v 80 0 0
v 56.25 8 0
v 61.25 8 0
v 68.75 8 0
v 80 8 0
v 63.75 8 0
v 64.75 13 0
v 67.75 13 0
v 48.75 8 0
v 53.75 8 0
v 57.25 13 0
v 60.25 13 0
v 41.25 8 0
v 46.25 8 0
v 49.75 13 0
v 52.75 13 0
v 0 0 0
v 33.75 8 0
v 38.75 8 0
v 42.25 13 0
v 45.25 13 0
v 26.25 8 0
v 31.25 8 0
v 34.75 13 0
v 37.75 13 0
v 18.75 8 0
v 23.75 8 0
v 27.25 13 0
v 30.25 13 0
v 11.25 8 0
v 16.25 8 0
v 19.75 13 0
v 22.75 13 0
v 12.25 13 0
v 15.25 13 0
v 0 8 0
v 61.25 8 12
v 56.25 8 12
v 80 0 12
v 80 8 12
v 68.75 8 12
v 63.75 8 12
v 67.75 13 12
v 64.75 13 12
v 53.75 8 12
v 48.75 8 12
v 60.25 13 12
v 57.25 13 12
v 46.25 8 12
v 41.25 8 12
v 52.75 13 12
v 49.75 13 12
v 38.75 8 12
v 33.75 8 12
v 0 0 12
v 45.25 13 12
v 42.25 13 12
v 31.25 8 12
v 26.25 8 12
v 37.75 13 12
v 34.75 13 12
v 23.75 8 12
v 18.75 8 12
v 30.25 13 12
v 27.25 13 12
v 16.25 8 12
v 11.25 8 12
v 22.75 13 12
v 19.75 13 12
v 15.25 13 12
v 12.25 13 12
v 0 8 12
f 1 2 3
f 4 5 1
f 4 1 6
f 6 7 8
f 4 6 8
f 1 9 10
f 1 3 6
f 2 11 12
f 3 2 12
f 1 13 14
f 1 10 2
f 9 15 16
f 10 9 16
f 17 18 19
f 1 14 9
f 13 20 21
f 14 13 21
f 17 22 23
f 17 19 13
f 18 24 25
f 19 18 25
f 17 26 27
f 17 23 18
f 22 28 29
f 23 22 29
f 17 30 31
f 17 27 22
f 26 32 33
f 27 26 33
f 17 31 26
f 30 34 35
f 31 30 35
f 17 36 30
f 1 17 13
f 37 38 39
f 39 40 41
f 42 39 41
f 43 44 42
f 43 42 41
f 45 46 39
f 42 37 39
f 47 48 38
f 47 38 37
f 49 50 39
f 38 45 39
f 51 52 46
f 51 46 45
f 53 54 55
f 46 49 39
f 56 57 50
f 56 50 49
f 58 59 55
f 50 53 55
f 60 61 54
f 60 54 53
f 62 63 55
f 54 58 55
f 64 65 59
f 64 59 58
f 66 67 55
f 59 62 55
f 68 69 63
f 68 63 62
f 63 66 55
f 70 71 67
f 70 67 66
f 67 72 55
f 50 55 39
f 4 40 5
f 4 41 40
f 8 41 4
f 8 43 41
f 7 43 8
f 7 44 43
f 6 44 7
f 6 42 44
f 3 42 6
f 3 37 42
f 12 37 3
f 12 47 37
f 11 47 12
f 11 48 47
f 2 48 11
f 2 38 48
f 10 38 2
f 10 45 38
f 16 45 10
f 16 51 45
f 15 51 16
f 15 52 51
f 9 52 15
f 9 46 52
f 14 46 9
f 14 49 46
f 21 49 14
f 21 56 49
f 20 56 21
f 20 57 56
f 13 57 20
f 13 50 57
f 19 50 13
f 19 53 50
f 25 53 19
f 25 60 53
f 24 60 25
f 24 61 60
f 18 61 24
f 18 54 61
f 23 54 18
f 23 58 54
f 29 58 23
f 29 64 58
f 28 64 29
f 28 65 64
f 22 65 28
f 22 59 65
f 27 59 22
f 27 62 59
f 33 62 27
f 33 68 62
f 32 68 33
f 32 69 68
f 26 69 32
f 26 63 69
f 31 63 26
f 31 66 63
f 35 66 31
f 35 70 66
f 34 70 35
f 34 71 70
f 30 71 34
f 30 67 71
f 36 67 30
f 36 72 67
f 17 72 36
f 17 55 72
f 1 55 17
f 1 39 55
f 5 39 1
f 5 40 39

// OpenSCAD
$fn = 32;

// ----------------------------------------------------------------------
// Gear rack: 8 teeth on a 80 mm bar, pitch 7.5 mm
// ----------------------------------------------------------------------

// --- parameters (mm) ---
profile_height = 12;      // extrusion height
profile_points = 36;      // points of the closed outline

profile = [[0, 0], [80, 0], [80, 8], [68.75, 8], [67.75, 13], [64.75, 13], [63.75, 8], [61.25, 8], [60.25, 13], [57.25, 13], [56.25, 8], [53.75, 8], [52.75, 13], [49.75, 13], [48.75, 8], [46.25, 8], [45.25, 13], [42.25, 13], [41.25, 8], [38.75, 8], [37.75, 13], [34.75, 13], [33.75, 8], [31.25, 8], [30.25, 13], [27.25, 13], [26.25, 8], [23.75, 8], [22.75, 13], [19.75, 13], [18.75, 8], [16.25, 8], [15.25, 13], [12.25, 13], [11.25, 8], [0, 8]];  // single closed polygon, 36 points, counter clockwise

// --- the one profile operation ---
linear_extrude(height = profile_height) polygon(points = profile);
